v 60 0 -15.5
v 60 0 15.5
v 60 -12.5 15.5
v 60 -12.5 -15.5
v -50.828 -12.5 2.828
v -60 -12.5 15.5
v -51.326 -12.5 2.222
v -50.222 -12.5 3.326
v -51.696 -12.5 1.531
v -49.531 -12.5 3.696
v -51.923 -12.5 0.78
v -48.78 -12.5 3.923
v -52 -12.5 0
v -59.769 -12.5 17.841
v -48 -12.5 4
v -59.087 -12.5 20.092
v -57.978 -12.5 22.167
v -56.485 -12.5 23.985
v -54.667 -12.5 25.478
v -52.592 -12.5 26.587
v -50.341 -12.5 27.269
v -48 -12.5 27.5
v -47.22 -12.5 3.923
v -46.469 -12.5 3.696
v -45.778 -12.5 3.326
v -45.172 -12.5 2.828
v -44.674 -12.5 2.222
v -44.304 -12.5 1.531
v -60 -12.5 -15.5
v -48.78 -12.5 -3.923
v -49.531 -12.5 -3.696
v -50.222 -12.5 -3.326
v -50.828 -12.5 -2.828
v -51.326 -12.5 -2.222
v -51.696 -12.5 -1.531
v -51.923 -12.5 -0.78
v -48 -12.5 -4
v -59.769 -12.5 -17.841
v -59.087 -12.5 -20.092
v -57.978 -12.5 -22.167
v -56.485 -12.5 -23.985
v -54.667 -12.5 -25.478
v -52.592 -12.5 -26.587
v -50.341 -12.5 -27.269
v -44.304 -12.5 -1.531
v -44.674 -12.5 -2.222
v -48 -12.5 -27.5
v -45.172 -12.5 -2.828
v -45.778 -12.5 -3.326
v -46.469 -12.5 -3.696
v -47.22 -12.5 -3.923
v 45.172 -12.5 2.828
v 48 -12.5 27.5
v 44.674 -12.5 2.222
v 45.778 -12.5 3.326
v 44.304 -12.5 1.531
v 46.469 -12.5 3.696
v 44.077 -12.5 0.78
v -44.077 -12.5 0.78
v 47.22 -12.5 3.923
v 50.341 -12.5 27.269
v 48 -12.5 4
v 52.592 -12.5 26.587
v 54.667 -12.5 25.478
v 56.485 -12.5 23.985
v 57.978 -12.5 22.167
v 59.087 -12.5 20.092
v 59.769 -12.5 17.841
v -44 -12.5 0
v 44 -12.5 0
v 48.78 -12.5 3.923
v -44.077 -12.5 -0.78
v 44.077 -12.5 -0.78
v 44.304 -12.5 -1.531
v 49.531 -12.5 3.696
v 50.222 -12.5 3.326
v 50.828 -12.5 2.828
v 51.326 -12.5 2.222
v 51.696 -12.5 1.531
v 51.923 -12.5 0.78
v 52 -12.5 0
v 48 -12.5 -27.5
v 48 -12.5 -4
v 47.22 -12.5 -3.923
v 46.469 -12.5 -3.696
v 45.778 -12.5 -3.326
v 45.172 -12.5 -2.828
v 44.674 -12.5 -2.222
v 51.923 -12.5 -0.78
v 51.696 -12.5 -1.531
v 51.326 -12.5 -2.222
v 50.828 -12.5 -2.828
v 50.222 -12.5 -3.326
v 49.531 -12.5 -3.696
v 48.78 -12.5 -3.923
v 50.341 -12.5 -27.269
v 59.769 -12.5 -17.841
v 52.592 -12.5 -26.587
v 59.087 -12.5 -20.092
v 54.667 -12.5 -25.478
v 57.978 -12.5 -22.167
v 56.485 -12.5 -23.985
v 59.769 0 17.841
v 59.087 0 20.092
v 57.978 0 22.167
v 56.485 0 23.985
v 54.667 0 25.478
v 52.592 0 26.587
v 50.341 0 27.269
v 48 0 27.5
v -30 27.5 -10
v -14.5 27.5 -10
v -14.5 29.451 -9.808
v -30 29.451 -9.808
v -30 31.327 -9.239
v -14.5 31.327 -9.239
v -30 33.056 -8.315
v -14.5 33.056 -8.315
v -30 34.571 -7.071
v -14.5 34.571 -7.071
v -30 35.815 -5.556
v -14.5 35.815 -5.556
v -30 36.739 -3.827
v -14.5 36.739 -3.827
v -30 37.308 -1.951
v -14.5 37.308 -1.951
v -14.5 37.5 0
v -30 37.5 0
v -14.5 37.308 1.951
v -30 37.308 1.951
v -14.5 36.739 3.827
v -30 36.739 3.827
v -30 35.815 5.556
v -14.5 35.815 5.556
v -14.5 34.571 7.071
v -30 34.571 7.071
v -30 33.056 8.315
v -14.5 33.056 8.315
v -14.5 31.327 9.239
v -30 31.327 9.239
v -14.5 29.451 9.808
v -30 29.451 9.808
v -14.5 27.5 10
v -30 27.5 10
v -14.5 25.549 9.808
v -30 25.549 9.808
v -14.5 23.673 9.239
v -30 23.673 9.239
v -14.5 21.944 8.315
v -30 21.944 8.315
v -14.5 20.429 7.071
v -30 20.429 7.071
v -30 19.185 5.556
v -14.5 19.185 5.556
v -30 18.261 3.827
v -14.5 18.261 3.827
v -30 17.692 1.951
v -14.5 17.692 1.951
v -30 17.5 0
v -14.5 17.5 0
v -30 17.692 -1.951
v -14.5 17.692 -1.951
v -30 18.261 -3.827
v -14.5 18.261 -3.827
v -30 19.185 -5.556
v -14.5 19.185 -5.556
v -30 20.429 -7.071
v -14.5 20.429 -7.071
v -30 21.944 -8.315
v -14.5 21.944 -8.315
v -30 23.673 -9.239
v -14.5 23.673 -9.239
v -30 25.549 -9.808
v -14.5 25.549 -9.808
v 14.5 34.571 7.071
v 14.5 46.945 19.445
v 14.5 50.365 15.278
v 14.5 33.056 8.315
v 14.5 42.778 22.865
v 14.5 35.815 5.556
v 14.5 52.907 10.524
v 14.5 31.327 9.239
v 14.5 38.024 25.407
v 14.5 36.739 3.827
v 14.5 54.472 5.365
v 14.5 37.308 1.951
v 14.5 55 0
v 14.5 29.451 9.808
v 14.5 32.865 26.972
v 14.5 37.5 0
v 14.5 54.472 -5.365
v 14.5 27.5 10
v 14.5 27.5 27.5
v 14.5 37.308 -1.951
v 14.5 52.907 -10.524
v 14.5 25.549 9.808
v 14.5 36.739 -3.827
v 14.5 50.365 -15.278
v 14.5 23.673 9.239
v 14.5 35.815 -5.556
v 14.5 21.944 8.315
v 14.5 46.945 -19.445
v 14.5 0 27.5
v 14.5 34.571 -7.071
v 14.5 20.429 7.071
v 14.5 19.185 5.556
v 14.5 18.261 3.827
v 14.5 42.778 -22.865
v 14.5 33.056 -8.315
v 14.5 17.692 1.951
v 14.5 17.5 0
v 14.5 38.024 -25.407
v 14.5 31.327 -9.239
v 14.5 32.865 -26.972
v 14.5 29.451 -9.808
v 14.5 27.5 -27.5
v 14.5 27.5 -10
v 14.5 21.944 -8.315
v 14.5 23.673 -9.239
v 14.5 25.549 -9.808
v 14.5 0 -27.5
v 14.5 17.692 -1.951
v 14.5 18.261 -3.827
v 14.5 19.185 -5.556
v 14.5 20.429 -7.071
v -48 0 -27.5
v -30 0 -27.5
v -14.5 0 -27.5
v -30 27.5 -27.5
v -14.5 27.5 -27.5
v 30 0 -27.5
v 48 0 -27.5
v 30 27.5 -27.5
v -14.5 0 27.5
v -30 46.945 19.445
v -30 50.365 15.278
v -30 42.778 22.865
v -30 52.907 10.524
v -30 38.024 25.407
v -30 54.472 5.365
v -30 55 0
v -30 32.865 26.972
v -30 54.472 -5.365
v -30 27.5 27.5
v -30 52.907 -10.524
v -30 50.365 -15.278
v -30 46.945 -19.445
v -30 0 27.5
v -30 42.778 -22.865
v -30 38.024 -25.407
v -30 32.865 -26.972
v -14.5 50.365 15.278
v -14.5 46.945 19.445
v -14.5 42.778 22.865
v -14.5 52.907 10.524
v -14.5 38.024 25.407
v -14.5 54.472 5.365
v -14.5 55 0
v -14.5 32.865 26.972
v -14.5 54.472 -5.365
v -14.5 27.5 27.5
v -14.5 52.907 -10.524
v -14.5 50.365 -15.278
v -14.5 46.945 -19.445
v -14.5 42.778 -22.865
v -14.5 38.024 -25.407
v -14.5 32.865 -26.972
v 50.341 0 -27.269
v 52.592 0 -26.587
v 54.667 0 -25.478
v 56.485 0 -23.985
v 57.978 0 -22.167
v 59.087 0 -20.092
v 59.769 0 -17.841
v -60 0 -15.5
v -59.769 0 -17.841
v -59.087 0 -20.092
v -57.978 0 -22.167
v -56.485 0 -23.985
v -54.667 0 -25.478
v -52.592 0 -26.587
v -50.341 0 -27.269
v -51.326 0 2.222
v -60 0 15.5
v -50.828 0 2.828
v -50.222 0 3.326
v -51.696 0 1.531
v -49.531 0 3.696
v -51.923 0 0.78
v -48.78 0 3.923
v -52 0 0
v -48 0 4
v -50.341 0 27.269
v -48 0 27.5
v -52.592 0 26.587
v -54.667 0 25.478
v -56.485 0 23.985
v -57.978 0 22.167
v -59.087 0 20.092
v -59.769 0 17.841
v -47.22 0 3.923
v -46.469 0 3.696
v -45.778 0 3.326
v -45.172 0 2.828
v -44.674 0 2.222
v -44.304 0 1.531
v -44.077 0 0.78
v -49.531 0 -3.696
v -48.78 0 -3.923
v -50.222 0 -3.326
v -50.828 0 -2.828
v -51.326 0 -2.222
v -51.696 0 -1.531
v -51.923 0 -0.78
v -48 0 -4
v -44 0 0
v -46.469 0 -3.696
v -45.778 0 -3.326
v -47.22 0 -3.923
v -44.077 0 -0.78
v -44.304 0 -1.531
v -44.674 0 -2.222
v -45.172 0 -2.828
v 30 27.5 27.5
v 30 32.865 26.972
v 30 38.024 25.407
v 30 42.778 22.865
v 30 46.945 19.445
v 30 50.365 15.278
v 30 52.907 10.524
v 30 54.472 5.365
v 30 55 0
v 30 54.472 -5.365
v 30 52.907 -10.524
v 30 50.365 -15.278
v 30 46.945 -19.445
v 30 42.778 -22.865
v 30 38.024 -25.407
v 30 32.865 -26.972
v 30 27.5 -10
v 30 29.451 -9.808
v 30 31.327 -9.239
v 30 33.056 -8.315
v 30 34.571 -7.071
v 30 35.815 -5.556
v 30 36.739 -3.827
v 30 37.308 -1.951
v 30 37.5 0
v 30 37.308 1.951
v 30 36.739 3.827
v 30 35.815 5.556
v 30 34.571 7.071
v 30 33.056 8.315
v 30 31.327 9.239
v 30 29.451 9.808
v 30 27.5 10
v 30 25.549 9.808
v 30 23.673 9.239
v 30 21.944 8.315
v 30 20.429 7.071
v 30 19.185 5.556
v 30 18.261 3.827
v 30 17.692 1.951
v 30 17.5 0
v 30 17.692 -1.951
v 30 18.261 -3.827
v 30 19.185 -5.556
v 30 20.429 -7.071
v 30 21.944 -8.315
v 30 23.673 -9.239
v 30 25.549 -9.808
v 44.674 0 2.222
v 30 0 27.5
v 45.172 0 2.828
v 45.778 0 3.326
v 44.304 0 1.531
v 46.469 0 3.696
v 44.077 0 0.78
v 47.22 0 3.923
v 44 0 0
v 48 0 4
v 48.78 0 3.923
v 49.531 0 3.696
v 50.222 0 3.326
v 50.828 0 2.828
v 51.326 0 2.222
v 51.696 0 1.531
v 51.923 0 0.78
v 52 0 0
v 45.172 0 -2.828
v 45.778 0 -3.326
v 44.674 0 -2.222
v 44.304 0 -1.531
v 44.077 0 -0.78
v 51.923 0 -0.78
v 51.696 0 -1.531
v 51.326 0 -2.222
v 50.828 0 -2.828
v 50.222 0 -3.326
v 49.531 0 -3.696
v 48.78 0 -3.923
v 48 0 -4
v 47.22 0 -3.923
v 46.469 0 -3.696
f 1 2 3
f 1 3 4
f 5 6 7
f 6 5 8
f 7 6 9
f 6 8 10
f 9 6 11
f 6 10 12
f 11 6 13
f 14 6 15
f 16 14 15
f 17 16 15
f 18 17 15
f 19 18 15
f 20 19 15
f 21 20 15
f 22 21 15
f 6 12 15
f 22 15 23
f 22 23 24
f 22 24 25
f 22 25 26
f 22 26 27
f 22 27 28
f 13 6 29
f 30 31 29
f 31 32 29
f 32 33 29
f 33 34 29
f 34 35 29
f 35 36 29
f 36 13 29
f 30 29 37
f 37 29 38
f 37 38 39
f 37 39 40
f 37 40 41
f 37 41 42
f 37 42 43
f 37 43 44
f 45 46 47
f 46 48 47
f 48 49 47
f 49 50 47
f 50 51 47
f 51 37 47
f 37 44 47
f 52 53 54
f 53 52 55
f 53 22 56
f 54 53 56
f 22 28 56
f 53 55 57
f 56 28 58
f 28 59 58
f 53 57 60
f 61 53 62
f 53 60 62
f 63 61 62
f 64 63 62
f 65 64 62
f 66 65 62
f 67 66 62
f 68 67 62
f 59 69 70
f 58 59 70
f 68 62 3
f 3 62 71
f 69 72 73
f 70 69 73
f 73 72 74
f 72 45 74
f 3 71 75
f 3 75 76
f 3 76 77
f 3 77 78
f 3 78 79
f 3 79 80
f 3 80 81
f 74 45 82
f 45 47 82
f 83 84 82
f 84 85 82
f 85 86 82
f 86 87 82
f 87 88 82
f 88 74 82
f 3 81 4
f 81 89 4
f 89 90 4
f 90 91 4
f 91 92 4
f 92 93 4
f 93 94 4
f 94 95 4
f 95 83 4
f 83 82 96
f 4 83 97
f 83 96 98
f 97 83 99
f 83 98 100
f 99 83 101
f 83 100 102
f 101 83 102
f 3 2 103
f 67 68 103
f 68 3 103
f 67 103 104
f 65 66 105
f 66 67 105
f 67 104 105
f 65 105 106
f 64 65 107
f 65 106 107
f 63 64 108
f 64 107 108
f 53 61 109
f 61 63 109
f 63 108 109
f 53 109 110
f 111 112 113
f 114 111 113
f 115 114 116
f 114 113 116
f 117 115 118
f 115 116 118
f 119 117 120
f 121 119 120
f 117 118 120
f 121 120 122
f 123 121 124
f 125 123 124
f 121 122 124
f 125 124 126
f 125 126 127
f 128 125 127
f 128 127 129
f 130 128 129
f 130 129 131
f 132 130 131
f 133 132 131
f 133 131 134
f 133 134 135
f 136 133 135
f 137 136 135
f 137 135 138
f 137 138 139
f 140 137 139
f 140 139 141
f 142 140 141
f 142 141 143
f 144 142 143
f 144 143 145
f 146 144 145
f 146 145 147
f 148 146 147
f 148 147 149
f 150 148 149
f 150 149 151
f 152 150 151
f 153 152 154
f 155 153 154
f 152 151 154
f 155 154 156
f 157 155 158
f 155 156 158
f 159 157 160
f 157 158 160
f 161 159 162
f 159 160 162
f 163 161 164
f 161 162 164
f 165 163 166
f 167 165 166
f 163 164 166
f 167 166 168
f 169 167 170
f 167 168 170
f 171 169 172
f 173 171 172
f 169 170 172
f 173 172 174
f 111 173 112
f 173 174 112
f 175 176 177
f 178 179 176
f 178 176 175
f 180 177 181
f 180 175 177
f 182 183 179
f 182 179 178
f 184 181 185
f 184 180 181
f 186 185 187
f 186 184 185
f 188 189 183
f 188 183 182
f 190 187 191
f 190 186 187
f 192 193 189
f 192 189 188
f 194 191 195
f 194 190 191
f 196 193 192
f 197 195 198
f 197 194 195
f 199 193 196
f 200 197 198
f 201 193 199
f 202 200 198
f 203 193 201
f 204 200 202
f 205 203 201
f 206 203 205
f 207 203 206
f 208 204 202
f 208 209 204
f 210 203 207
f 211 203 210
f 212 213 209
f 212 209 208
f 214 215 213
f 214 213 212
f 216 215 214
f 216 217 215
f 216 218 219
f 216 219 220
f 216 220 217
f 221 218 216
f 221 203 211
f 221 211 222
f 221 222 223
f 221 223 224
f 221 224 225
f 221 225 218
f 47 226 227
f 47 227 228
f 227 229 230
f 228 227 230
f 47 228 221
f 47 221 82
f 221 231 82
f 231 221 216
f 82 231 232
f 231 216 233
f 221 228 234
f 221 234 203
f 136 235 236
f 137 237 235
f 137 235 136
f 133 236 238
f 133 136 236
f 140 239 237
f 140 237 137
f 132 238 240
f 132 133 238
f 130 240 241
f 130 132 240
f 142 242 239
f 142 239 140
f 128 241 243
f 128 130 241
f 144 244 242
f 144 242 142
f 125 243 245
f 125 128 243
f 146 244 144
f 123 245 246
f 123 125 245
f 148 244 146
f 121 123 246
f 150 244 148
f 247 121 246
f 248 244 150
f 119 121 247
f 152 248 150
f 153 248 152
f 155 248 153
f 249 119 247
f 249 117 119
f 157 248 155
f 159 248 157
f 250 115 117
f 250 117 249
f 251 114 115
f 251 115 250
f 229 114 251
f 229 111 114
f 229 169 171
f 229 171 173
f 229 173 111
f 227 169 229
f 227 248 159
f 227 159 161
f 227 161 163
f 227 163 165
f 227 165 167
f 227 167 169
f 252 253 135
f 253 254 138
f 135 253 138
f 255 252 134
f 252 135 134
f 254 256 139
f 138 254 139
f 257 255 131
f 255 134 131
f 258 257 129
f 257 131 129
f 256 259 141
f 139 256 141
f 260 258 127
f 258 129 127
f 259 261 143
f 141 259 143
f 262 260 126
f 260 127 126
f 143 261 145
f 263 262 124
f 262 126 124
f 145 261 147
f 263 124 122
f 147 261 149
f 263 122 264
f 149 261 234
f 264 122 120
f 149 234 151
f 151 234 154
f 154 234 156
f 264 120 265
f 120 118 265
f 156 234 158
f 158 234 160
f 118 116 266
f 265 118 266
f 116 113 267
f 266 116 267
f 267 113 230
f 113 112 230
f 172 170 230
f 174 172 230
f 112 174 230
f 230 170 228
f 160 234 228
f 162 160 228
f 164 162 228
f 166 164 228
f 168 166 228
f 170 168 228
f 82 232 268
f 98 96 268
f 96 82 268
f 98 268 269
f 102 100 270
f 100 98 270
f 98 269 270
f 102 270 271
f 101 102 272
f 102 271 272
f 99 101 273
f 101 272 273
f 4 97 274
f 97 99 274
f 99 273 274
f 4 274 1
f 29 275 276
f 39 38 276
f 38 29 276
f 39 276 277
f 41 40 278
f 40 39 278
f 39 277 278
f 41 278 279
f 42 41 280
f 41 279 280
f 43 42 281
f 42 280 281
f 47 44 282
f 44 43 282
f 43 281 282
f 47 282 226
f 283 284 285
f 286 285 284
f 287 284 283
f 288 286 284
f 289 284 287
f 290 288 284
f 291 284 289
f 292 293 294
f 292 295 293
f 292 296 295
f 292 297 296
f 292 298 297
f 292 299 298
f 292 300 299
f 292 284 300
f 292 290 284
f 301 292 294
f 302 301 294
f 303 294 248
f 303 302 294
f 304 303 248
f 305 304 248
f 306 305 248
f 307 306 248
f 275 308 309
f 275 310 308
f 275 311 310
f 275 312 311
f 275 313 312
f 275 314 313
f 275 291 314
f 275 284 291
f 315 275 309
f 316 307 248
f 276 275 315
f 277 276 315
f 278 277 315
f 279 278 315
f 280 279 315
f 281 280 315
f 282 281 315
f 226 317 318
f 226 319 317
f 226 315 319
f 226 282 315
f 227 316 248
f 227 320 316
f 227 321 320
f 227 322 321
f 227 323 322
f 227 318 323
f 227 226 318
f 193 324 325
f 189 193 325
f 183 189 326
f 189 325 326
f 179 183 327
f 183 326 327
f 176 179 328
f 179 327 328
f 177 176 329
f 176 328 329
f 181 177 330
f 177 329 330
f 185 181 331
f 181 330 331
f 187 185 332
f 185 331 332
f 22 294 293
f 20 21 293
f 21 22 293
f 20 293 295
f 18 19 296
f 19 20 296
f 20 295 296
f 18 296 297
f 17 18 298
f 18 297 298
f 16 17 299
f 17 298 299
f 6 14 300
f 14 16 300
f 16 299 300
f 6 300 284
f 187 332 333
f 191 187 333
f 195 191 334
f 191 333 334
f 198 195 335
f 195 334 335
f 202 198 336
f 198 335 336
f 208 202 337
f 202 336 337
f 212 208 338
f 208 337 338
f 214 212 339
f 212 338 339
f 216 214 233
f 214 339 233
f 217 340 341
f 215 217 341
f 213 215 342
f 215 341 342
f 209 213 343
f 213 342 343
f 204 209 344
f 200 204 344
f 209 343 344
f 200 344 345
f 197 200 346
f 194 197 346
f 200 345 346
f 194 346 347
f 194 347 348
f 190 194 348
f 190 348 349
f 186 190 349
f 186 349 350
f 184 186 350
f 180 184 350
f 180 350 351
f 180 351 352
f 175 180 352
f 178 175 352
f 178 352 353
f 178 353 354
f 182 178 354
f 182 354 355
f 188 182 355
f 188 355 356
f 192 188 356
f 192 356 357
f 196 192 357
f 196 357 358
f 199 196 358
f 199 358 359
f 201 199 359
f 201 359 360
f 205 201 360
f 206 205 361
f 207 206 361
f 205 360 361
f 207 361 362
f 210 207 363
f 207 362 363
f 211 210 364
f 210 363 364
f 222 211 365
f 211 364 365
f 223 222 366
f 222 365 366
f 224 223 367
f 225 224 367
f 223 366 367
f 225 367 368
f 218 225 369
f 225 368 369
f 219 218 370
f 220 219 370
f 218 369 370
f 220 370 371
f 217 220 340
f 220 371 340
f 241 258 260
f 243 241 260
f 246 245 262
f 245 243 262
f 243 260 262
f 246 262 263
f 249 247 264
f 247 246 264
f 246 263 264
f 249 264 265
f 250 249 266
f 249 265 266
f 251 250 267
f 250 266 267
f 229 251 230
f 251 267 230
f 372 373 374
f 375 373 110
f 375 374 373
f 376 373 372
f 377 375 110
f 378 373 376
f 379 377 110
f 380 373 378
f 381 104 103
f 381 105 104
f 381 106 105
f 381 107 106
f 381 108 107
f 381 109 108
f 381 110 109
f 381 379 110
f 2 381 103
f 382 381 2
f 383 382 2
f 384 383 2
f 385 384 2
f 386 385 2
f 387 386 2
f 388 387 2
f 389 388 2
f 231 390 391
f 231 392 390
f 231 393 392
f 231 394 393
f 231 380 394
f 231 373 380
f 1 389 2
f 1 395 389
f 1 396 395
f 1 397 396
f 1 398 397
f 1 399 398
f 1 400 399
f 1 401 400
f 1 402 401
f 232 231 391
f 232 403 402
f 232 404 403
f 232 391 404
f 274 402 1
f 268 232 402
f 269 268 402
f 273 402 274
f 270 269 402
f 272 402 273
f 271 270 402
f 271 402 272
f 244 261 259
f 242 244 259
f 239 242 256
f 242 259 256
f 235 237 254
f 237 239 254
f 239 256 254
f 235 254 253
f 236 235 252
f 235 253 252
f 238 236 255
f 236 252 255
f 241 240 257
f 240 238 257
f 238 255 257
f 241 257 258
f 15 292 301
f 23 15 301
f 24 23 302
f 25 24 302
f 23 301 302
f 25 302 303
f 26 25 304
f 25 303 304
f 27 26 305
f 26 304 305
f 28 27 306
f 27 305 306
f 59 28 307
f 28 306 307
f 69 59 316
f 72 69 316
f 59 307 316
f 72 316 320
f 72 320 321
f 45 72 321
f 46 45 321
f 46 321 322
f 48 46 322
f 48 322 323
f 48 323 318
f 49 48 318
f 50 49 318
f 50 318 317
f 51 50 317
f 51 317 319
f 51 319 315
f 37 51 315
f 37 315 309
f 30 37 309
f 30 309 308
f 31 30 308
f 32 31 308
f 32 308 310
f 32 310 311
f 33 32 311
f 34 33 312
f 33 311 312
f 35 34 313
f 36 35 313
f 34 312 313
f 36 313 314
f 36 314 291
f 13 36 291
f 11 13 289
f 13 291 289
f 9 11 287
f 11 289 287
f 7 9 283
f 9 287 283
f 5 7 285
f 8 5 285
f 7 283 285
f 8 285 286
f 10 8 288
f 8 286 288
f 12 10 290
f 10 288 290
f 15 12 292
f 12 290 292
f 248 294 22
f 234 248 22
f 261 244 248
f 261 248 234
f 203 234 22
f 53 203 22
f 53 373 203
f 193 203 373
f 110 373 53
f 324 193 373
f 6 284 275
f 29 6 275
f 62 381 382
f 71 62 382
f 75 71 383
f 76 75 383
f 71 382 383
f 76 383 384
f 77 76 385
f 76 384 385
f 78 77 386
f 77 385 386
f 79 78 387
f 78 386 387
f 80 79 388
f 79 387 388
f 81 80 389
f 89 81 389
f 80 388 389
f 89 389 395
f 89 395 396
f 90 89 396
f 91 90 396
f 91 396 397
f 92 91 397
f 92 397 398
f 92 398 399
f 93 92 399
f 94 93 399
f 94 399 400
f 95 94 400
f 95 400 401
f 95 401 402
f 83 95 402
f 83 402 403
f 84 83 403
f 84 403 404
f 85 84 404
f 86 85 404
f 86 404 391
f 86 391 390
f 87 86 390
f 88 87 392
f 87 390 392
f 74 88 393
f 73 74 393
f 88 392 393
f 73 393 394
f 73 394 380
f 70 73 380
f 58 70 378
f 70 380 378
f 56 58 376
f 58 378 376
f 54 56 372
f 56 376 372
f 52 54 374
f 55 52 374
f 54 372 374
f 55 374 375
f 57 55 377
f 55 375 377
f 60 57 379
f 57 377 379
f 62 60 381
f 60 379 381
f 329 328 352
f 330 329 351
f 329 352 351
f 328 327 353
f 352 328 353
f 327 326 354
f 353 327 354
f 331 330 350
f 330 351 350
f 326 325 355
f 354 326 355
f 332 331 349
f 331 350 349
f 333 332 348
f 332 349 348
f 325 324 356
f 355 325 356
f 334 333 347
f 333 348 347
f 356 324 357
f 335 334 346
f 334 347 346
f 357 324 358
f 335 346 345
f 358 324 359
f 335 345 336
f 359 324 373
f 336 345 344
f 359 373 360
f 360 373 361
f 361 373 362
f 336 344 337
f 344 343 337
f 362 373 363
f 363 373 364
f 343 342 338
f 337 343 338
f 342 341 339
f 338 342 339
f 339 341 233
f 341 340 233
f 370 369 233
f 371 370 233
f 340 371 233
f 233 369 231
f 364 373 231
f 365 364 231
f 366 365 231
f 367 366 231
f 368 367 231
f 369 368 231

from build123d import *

# Parameters (mm, degrees)
SKETCH1_W           = 120
SKETCH1_H           = 55
BOSS_EXTRUDE1_DEPTH = 12.5
SKETCH3_W           = 15.5
SKETCH3_H           = 55
BOSS_EXTRUDE2_DEPTH = 55
SKETCH6_R           = 10
CUT_EXTRUDE1_DEPTH  = 110.001146783
CUT_EXTRUDE4_DEPTH  = 86.914201387
SKETCH8_R           = 4
CUT_EXTRUDE5_DEPTH  = 86.914201387


with BuildPart() as part:
    # Sketch1 → Boss-Extrude1 (new body)
    with BuildSketch(Plane(origin=(0, 0, 0), x_dir=(1, 0, 0), z_dir=(0, 1, 0))):
        Rectangle(SKETCH1_W, SKETCH1_H)
    extrude(amount=-BOSS_EXTRUDE1_DEPTH)

    # Sketch3 → Boss-Extrude2 (add)
    with BuildSketch(Plane(origin=(0, 0, 0), x_dir=(1, 0, 0), z_dir=(0, 1, 0))):
        with Locations((22.25, 0)):
            Rectangle(SKETCH3_W, SKETCH3_H)
        with Locations((-22.25, 0)):
            Rectangle(SKETCH3_W, SKETCH3_H)
    extrude(amount=BOSS_EXTRUDE2_DEPTH)

    # Sketch6 → Cut-Extrude1 (cut, through all)
    with BuildSketch(Plane(origin=(30, 0, 0), x_dir=(0, 0, -1), z_dir=(1, 0, 0))):
        with BuildLine():
            Line((-27.5, 55), (-27.5, 27.5))
            ThreePointArc((-27.5, 27.5), (-19.445436492, 46.945436473), (-2.7e-08, 55))
            Line((-2.7e-08, 55), (-27.5, 55))
        make_face()
        with BuildLine():
            Line((27.5, 55), (-2.7e-08, 55))
            ThreePointArc((-2.7e-08, 55), (19.445436473, 46.945436492), (27.5, 27.5))
            Line((27.5, 27.5), (27.5, 55))
        make_face()
        with Locations((0, 27.5)):
            Circle(SKETCH6_R)
    extrude(amount=-CUT_EXTRUDE1_DEPTH, mode=Mode.SUBTRACT)

    # Sketch7 → Cut-Extrude4 (cut, through all)
    with BuildSketch(Plane(origin=(0, 0, 0), x_dir=(1, 0, 0), z_dir=(0, 1, 0))):
        with BuildLine():
            Line((60, -27.5), (60, -15.5))
            ThreePointArc((60, -15.5), (56.485281374, -23.985281374), (48, -27.5))
            Line((48, -27.5), (60, -27.5))
        make_face()
        with BuildLine():
            ThreePointArc((48, 27.5), (56.485281374, 23.985281374), (60, 15.5))
            Line((60, 15.5), (60, 27.5))
            Line((60, 27.5), (48, 27.5))
        make_face()
        with BuildLine():
            Line((-60, 27.5), (-60, 15.5))
            ThreePointArc((-60, 15.5), (-56.485281374, 23.985281374), (-48, 27.5))
            Line((-48, 27.5), (-60, 27.5))
        make_face()
        with BuildLine():
            ThreePointArc((-48, -27.5), (-56.485281374, -23.985281374), (-60, -15.5))
            Line((-60, -15.5), (-60, -27.5))
            Line((-60, -27.5), (-48, -27.5))
        make_face()
    extrude(amount=-CUT_EXTRUDE4_DEPTH, mode=Mode.SUBTRACT)

    # Sketch8 → Cut-Extrude5 (cut, through all)
    with BuildSketch(Plane(origin=(0, 0, 0), x_dir=(1, 0, 0), z_dir=(0, 1, 0))):
        with Locations(Location((-48, 0, 0), (0, 0, 270))):
            Circle(SKETCH8_R)
        with Locations(Location((48, 0, 0), (0, 0, 270))):
            Circle(SKETCH8_R)
    extrude(amount=-CUT_EXTRUDE5_DEPTH, mode=Mode.SUBTRACT)


solid = part.part
